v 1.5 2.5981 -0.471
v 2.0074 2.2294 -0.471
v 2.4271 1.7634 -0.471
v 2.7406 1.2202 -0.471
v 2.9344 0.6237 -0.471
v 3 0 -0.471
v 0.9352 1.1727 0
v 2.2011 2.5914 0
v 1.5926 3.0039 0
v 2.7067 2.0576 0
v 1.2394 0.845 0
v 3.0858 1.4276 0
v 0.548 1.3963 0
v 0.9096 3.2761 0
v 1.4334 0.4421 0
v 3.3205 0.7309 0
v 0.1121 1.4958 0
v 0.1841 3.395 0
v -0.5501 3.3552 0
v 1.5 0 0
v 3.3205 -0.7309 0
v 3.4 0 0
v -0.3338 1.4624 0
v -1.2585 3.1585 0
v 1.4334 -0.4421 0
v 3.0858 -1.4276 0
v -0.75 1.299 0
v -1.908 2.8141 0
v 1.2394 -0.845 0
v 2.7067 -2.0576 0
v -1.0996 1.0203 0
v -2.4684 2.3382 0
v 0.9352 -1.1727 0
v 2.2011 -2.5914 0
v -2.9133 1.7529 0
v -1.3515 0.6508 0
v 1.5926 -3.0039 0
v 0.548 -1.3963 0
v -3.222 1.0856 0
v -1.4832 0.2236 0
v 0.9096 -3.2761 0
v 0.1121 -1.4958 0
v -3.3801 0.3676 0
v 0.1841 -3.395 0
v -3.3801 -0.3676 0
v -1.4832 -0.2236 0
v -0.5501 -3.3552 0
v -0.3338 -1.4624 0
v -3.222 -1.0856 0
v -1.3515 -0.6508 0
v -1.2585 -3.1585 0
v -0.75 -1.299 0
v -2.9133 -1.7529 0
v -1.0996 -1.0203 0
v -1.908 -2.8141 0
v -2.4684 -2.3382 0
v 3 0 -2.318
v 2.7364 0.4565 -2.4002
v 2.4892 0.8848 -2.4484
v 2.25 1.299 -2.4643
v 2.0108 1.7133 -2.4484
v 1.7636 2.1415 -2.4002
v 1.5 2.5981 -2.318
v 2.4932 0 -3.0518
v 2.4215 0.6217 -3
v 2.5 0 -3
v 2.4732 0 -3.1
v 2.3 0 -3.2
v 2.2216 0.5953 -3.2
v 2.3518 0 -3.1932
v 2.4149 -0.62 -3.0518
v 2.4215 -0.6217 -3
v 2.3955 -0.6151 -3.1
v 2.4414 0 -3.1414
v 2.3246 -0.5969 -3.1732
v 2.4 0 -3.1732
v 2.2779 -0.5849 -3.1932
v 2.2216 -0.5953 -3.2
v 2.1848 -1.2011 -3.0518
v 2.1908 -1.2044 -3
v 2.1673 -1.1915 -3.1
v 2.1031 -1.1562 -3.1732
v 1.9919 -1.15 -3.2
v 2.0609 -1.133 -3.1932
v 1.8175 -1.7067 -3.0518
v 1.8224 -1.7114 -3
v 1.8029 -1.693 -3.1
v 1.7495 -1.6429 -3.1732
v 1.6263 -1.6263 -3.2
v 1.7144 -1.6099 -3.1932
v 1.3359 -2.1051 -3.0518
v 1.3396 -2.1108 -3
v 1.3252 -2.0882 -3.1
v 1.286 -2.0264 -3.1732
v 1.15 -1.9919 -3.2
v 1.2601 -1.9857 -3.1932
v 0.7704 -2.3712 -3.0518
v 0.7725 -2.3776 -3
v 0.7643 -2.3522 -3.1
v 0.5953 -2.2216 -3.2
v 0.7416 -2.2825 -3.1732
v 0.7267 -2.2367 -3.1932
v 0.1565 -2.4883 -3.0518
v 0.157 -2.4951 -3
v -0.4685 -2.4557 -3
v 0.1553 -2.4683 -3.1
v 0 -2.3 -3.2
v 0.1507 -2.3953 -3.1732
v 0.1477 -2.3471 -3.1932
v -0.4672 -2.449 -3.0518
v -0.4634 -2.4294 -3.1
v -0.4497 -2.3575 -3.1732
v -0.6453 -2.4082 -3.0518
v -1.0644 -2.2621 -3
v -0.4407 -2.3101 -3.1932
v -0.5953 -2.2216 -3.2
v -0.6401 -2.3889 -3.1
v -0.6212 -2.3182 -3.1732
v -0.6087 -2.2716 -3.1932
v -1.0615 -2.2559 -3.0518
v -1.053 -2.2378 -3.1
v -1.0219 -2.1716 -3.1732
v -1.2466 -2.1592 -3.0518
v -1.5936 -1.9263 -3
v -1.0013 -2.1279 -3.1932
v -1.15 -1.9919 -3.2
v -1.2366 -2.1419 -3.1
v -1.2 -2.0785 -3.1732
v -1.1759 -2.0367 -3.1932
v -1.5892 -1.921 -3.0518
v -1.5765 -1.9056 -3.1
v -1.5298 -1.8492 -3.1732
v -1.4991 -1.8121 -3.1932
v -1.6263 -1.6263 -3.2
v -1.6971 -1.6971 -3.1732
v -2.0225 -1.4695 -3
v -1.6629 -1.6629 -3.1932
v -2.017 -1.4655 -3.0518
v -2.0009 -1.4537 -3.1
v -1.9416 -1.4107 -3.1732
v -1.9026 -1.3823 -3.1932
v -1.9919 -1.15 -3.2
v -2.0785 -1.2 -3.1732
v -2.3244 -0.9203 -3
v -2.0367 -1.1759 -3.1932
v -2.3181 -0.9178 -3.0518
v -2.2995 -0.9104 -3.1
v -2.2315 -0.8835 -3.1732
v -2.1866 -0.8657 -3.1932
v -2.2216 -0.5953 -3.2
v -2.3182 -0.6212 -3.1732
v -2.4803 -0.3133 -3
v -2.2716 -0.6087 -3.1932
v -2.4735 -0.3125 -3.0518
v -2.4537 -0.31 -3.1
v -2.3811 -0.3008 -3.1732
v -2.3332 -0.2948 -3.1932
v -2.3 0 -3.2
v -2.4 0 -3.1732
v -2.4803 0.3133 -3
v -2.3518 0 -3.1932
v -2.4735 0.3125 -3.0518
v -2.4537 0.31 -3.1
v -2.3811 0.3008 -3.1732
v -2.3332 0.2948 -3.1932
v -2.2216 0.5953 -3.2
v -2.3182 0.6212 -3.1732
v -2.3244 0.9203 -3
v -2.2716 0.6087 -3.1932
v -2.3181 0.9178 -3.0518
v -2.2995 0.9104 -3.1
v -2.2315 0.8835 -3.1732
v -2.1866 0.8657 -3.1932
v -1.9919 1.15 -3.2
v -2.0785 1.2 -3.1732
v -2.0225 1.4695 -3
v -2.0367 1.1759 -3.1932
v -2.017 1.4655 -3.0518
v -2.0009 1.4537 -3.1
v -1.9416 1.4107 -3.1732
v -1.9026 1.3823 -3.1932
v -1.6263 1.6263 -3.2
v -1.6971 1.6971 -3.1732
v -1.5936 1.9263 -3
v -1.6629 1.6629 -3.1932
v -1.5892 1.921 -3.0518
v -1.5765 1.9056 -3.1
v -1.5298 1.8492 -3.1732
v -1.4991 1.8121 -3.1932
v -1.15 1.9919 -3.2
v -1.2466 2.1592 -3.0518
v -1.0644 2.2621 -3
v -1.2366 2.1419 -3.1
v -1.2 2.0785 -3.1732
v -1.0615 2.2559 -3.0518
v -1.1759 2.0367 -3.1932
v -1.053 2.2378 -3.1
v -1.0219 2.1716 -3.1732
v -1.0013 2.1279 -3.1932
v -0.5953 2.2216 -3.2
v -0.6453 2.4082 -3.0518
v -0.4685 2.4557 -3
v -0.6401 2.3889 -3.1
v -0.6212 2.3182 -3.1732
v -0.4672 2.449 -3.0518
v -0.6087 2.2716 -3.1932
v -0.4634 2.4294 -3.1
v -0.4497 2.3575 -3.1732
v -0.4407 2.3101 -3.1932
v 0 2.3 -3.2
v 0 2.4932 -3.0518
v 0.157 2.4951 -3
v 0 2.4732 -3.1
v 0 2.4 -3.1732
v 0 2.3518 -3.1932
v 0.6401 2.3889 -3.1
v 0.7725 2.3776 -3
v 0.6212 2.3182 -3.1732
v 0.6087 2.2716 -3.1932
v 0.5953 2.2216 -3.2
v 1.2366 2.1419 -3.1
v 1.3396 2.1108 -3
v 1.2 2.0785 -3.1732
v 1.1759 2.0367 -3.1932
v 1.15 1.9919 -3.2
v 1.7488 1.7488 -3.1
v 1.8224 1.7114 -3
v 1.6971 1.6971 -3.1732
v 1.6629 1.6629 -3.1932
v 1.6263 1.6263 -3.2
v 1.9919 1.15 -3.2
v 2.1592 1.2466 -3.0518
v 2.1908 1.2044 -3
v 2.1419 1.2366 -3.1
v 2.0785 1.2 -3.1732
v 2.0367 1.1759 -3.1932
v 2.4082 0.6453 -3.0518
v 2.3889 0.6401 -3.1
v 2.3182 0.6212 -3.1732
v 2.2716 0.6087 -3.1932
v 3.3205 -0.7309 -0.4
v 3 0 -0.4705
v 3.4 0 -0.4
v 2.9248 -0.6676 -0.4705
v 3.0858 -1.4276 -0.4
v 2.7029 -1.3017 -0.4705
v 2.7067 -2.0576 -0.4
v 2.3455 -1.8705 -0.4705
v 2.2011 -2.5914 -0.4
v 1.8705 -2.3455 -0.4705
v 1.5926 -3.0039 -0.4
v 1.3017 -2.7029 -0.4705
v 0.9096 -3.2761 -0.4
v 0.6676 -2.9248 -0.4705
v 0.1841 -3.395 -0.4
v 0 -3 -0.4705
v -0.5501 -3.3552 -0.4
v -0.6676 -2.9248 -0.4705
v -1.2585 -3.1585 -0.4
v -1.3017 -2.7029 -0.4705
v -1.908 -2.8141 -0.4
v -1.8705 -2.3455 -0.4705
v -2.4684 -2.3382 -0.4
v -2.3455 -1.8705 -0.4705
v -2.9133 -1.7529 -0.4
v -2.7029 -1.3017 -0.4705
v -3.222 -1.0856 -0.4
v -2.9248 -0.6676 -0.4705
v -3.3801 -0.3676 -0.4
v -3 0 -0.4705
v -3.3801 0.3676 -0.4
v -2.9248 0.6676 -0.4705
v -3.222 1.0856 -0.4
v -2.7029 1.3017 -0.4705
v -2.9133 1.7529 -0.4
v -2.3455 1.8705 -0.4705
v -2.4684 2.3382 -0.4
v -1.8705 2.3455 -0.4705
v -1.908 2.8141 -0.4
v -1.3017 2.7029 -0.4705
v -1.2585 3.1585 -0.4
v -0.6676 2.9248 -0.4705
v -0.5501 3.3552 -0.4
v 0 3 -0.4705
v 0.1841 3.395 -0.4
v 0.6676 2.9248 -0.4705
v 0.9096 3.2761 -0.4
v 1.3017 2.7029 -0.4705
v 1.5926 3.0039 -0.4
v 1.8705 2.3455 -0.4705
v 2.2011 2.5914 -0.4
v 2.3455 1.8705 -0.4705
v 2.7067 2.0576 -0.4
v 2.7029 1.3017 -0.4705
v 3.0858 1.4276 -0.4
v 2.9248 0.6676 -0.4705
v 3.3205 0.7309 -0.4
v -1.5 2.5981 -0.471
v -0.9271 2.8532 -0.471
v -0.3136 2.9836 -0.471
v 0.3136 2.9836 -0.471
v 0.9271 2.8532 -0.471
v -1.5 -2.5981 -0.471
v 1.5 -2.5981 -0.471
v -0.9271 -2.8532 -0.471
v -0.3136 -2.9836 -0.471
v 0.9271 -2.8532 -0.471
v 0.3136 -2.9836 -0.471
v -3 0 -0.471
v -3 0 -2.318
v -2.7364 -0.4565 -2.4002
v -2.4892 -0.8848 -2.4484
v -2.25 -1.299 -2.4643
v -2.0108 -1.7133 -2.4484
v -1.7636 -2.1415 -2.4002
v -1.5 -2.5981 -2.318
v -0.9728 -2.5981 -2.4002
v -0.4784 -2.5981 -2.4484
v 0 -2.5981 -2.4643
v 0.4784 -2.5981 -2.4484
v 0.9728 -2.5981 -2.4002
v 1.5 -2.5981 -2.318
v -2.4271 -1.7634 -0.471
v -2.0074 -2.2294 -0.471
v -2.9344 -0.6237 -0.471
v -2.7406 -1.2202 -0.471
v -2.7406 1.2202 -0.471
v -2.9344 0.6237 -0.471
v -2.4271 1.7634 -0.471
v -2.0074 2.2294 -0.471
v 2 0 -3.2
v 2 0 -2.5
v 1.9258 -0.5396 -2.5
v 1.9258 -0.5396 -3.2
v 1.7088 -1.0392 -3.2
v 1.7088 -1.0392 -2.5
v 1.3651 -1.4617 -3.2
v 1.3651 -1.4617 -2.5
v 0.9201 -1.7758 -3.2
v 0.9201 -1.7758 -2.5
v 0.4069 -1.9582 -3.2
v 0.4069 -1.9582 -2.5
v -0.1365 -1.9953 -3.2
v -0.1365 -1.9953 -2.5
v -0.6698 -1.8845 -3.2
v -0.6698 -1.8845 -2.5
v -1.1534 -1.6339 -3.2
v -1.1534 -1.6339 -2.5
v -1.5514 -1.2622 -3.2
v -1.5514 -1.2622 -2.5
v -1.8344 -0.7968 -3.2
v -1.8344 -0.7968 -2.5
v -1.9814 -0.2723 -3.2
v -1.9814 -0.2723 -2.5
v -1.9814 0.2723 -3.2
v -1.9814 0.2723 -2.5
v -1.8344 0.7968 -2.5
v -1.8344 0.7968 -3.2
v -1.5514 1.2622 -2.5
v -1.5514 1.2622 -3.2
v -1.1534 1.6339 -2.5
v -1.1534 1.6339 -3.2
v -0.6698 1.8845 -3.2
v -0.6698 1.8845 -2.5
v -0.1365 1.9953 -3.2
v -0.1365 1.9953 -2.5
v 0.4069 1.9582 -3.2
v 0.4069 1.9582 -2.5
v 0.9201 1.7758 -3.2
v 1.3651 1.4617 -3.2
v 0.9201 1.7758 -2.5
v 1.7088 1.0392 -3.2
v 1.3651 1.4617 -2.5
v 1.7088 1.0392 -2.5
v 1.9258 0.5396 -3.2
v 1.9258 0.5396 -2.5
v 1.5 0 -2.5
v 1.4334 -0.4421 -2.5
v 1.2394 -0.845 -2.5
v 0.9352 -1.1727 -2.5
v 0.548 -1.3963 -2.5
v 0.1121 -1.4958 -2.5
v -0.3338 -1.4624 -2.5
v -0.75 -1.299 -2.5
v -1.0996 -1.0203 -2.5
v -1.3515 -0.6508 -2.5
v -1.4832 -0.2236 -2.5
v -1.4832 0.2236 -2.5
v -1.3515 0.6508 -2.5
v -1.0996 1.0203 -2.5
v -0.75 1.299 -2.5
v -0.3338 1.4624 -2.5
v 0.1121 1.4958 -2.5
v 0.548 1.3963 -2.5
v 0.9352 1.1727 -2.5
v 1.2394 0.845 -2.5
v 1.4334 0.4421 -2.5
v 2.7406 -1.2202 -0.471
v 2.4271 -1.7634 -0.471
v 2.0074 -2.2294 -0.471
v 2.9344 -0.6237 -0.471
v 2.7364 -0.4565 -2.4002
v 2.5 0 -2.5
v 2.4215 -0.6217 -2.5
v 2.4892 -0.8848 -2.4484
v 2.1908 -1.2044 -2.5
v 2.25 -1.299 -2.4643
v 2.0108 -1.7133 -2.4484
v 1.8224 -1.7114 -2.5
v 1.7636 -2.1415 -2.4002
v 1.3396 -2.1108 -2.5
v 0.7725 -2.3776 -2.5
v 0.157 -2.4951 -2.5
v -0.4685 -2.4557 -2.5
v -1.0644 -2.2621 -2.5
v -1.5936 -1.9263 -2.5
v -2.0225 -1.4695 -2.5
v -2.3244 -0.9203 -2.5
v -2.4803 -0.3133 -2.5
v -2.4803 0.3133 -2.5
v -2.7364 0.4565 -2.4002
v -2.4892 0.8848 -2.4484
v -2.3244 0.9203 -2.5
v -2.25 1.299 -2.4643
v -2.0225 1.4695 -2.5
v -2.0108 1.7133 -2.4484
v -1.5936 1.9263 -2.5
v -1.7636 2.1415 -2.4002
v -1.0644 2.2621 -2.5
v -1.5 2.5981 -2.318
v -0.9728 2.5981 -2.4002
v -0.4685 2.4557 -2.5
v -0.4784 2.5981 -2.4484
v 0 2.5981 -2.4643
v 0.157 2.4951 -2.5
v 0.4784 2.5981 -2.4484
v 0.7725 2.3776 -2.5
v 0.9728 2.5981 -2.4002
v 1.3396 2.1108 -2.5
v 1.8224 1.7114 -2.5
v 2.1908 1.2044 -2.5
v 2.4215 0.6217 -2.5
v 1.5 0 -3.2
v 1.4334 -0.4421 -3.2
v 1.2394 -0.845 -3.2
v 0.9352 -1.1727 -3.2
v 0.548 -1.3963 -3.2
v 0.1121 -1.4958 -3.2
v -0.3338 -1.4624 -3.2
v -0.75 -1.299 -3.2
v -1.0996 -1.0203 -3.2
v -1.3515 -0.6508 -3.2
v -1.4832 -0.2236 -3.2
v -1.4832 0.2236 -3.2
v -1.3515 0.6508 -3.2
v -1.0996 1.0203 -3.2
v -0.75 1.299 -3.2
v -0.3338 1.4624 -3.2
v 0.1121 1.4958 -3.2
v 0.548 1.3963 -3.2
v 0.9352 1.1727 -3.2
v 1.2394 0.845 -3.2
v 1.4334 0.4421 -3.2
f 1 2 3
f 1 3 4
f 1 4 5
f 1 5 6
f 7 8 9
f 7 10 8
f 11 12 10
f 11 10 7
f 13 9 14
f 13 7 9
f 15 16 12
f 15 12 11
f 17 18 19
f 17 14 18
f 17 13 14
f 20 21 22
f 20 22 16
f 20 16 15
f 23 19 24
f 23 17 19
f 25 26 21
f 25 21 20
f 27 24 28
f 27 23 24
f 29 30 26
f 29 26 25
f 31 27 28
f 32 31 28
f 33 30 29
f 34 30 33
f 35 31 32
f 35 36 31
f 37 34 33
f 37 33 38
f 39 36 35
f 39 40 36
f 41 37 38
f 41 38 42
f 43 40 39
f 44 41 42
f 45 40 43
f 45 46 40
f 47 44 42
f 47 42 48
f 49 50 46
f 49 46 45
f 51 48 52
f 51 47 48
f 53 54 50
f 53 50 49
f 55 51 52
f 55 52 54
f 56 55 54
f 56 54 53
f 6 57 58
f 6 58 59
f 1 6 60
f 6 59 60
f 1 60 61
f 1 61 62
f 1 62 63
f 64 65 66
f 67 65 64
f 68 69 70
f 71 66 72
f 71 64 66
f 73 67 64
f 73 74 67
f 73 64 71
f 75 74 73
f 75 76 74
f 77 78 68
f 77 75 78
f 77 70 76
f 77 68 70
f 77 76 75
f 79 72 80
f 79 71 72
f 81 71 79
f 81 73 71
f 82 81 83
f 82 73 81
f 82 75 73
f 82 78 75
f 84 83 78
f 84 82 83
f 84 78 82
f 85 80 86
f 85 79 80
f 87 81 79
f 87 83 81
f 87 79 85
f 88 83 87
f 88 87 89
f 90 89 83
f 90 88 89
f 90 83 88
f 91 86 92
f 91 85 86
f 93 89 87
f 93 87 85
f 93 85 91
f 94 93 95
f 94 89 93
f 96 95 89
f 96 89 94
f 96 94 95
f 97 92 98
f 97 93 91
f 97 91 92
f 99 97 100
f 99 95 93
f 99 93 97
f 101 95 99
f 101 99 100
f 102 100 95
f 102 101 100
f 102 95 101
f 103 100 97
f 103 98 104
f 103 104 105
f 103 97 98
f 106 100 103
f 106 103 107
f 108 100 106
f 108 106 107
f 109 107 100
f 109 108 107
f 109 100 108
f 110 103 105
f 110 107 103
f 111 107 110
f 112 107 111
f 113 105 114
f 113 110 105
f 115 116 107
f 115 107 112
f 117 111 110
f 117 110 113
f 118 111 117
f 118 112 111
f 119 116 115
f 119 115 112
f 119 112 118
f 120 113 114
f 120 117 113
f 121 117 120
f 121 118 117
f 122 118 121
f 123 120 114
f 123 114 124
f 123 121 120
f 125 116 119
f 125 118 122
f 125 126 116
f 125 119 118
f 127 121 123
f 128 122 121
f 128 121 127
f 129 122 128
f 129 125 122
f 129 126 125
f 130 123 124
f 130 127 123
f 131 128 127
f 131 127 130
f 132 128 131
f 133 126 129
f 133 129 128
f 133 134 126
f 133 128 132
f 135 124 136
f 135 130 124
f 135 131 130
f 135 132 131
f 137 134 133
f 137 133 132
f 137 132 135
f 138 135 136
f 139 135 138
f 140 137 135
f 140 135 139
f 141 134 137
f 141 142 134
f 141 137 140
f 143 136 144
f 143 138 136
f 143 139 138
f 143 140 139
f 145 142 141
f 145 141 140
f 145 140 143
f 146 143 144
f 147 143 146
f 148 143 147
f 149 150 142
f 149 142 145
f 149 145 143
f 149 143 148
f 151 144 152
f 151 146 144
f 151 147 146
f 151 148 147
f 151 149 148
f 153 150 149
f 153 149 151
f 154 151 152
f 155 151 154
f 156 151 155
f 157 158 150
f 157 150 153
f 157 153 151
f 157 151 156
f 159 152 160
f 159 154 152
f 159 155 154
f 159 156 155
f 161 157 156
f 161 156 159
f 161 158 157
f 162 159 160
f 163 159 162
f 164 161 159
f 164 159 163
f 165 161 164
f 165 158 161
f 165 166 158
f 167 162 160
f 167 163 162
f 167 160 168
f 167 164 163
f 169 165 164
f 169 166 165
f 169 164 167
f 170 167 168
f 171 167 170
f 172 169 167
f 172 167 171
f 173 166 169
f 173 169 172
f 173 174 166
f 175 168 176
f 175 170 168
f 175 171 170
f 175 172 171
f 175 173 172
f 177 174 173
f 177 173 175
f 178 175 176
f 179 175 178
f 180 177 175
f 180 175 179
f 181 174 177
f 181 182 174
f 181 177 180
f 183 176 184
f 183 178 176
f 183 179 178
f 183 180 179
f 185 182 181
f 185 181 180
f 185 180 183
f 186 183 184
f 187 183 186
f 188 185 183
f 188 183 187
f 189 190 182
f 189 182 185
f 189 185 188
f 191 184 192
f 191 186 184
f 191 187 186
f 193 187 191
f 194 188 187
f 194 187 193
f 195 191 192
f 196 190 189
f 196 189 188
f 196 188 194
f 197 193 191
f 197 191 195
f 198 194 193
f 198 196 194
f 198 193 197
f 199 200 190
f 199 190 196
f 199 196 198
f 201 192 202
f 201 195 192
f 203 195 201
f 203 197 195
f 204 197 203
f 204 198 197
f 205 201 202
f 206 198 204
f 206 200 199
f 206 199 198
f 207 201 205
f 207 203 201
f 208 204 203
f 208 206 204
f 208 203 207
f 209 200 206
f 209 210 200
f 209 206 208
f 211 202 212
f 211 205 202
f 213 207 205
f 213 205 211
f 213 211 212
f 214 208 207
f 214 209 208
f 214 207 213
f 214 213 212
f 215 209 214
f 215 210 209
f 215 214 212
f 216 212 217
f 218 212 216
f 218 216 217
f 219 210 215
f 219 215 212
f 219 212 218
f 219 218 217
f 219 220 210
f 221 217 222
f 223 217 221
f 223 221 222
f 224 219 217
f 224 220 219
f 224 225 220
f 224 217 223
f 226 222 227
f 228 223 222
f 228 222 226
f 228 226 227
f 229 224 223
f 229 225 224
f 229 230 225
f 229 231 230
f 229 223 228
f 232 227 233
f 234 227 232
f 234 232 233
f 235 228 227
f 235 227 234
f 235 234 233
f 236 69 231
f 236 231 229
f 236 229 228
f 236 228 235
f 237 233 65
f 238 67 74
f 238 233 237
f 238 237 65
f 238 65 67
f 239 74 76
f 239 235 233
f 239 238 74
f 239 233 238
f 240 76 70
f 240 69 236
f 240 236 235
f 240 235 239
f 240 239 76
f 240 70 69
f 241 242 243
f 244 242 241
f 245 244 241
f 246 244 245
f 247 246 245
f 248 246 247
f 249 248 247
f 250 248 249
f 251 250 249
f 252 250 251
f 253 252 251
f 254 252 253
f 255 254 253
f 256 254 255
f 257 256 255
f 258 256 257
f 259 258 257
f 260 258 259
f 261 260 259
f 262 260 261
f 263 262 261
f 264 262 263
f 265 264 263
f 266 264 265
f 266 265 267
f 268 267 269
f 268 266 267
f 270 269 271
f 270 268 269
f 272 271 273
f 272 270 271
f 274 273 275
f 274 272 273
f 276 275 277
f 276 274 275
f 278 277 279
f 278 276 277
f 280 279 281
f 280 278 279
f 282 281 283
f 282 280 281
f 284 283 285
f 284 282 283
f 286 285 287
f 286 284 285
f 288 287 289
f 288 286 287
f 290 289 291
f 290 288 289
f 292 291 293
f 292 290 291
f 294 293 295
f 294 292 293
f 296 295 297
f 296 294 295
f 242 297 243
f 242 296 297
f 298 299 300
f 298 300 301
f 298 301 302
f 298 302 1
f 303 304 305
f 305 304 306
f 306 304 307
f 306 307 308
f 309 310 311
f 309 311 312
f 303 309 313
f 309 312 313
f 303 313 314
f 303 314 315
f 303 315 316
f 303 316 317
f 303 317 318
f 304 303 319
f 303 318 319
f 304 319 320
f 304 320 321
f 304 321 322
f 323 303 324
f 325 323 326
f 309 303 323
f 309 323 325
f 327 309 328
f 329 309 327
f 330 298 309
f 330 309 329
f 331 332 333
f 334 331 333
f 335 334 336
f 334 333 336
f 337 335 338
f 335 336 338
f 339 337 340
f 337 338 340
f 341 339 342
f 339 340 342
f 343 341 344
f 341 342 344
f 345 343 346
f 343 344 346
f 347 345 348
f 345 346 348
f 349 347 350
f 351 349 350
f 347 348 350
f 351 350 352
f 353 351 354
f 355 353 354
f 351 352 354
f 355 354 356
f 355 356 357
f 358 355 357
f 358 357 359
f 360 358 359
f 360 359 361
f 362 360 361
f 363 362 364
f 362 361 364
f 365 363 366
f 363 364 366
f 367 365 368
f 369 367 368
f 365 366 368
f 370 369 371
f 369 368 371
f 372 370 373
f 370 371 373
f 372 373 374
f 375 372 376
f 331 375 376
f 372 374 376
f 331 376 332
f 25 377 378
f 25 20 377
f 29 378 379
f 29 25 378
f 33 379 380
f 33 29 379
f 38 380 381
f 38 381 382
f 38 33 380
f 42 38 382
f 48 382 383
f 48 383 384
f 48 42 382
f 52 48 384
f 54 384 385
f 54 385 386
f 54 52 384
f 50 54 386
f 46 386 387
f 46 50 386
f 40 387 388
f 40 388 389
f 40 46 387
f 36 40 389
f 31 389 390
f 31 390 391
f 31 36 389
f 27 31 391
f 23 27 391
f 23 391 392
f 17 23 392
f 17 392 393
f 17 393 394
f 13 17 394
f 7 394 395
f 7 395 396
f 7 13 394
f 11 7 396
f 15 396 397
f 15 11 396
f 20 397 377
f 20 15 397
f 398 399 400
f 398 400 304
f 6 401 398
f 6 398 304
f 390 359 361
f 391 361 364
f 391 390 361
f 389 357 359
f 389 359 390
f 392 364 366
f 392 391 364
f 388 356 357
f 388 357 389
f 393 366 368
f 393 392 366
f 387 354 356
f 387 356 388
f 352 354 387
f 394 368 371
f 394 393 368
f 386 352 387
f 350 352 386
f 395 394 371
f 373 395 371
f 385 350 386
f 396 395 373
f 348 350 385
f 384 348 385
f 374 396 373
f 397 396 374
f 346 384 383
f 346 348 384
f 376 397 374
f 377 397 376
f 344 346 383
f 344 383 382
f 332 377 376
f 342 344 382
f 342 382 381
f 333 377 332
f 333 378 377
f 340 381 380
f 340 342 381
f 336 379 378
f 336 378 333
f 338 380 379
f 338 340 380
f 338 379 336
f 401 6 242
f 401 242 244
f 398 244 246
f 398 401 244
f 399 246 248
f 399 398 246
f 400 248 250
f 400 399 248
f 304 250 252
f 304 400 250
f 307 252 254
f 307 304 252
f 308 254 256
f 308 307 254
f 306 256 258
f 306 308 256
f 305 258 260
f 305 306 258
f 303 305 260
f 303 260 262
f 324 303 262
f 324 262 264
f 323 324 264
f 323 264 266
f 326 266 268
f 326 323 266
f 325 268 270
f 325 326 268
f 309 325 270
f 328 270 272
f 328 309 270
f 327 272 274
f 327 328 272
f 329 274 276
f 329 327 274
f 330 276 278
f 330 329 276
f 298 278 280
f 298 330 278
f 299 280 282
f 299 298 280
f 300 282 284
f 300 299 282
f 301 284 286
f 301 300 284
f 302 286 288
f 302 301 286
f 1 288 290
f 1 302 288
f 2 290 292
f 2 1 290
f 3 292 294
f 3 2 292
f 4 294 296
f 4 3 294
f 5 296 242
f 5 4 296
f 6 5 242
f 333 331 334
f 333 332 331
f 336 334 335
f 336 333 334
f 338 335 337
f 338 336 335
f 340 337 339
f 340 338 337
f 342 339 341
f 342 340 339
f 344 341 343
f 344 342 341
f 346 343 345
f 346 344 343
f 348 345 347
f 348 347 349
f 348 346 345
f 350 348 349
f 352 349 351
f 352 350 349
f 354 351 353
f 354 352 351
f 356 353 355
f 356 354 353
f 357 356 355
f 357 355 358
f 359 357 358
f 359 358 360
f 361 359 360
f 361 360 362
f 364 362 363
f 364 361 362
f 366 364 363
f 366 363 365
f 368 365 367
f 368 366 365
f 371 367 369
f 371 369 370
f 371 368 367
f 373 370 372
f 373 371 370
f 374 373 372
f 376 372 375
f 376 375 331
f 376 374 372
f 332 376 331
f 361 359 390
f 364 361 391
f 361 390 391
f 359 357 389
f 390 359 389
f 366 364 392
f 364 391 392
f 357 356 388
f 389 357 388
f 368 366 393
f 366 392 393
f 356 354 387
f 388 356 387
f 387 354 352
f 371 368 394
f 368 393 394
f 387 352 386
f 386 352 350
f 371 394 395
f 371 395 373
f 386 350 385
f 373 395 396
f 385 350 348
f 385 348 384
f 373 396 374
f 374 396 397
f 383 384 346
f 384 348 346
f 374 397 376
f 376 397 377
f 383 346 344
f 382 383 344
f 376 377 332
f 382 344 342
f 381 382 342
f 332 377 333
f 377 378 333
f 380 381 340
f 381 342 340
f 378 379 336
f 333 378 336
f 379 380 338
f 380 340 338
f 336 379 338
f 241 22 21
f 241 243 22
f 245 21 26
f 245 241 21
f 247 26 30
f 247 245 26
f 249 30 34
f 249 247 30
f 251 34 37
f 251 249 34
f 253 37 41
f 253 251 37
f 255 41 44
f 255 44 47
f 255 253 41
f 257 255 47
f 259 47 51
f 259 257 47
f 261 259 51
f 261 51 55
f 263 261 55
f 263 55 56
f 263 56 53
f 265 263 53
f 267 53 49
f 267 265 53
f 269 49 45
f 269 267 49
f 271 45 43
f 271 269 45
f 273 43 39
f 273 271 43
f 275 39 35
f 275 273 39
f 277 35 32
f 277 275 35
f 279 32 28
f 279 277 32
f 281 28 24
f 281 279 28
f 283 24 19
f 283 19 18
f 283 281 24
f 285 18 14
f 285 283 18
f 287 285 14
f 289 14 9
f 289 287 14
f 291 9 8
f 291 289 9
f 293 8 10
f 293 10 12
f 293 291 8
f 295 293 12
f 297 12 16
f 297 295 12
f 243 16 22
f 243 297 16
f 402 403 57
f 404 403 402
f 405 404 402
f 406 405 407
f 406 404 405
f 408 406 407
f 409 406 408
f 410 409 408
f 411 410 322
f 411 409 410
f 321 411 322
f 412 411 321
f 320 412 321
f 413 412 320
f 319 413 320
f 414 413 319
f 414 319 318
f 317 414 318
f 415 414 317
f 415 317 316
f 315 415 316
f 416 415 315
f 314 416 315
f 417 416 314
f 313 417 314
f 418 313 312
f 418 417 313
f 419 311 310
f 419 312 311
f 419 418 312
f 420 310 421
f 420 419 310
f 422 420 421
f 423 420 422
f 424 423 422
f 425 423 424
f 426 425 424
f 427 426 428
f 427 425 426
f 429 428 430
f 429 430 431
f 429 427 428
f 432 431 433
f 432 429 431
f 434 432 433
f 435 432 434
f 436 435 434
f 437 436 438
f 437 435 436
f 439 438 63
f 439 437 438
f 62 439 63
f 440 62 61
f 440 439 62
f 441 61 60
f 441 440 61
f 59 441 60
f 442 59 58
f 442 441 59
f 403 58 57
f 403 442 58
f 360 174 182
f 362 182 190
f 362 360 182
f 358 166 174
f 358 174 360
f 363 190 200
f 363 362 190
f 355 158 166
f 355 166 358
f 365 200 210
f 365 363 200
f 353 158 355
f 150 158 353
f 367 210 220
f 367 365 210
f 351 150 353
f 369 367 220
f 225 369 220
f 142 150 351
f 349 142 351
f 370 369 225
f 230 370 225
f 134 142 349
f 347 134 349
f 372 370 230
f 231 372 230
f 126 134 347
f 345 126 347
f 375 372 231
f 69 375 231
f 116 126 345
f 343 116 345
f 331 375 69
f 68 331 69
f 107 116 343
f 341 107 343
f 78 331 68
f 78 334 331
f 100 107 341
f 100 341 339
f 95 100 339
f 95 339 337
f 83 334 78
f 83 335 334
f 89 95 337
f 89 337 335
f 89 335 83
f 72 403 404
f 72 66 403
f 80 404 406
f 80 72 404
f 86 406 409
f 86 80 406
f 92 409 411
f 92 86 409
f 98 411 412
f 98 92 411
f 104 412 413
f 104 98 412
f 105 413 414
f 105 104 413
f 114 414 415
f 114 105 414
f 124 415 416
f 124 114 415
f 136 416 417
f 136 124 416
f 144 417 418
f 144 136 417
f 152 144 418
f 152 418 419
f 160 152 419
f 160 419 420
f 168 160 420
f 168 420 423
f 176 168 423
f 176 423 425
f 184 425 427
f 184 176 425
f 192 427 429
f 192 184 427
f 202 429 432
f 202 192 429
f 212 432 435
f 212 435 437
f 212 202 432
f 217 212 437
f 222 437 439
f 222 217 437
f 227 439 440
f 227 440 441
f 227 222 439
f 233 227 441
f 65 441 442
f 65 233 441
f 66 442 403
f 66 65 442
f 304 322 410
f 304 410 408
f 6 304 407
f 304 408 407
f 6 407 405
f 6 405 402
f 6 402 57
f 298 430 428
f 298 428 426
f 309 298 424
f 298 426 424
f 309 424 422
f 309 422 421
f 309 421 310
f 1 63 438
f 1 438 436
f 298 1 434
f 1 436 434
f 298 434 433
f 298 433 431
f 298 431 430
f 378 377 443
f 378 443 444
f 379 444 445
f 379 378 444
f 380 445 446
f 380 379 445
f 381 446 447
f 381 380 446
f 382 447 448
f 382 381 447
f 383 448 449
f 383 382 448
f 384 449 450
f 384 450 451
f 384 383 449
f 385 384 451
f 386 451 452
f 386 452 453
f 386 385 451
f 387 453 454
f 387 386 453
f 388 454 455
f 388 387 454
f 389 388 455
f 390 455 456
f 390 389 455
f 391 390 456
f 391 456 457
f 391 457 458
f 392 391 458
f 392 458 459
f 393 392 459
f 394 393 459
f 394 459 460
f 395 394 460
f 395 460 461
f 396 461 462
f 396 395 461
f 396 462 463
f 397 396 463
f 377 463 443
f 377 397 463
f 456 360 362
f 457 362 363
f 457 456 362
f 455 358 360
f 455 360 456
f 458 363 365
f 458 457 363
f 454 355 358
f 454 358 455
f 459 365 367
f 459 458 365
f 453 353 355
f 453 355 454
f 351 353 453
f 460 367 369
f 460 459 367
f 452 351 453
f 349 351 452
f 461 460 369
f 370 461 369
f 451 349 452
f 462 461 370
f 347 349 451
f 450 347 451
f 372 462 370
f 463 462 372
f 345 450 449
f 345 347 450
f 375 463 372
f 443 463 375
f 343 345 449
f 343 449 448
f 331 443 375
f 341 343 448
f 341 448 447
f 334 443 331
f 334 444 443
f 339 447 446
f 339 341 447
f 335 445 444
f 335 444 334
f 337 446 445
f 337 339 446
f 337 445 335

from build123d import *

# Parameters (mm, degrees)
CUT_EXTRUDE_2_DEPTH = 2.729
CUT_EXTRUDE_3_DEPTH = 2.729
CUT_EXTRUDE_8_DEPTH = 2.729
CUT_EXTRUDE_7_DEPTH = 2.729
SKETCH_11_R         = 2
SKETCH_11_R_2       = 1.5
EXTRUDE_3_DEPTH     = 0.7
CUT_EXTRUDE_9_DEPTH = 2.729


with BuildPart() as part:
    # 草图2 → 旋转2 (revolve)
    with BuildSketch(Plane(origin=(0, 0, 0), x_dir=(0, 0, -1), z_dir=(1, 0, 0)), mode=Mode.PRIVATE) as revolve_2_sk:
        with BuildLine():
            Line((0, 1.5), (0, 3.4))
            Line((0, 3.4), (0.4, 3.4))
            Line((0.4, 3.4), (0.470530792, 3))
            Line((0.470530792, 3), (2.318014883, 3))
            Line((2.318014883, 3), (2.5, 2.5))
            Line((2.5, 2.5), (3, 2.5))
            ThreePointArc((3, 2.5), (3.141421356, 2.441421356), (3.2, 2.3))
            Line((3.2, 2.3), (3.2, 2))
            Line((3.2, 2), (2.5, 2))
            Line((2.5, 2), (2.5, 1.5))
            Line((2.5, 1.5), (0, 1.5))
        make_face()
    revolve(revolve_2_sk.sketch.rotate(Axis((0, 0, 0), (0, 0, -1)), 90), axis=Axis((0, 0, 0), (0, 0, -1)))

    # 草图10 → 切除-拉伸2 (cut)
    with BuildSketch(Plane(origin=(0, 0, -3.2), x_dir=(-1, 0, 0), z_dir=(0, 0, -1))):
        with BuildLine():
            Line((-3, 0), (-1.5, 2.598076211))
            ThreePointArc((-1.5, 2.598076211), (-2.598076211, 1.5), (-3, 0))
        make_face()
    extrude(amount=-CUT_EXTRUDE_2_DEPTH, mode=Mode.SUBTRACT)

    # 草图10<4> → 切除-拉伸3 (cut)
    with BuildSketch(Plane(origin=(0, 0, -3.2), x_dir=(-1, 0, 0), z_dir=(0, 0, -1))):
        with BuildLine():
            Line((-1.5, -2.598076211), (-3, 0))
            ThreePointArc((-3, 0), (-2.598076211, -1.5), (-1.5, -2.598076211))
        make_face()
    extrude(amount=-CUT_EXTRUDE_3_DEPTH, mode=Mode.SUBTRACT)

    # 草图10<8> → 切除-拉伸8 (cut)
    with BuildSketch(Plane(origin=(0, 0, -3.2), x_dir=(-1, 0, 0), z_dir=(0, 0, -1))):
        with BuildLine():
            ThreePointArc((1.5, 2.598076211), (0, 3), (-1.5, 2.598076211))
            Line((-1.5, 2.598076211), (1.5, 2.598076211))
        make_face()
    extrude(amount=-CUT_EXTRUDE_8_DEPTH, mode=Mode.SUBTRACT)

    # 草图10<7> → 切除-拉伸7 (cut)
    with BuildSketch(Plane(origin=(0, 0, -3.2), x_dir=(-1, 0, 0), z_dir=(0, 0, -1))):
        with BuildLine():
            ThreePointArc((1.5, 2.598076211), (0, 3), (-1.5, 2.598076211))
            Line((-1.5, 2.598076211), (1.5, 2.598076211))
        make_face()
        with BuildLine():
            ThreePointArc((3, 0), (2.598076211, 1.5), (1.5, 2.598076211))
            Line((1.5, 2.598076211), (3, 0))
        make_face()
        with BuildLine():
            ThreePointArc((1.5, -2.598076211), (2.598076211, -1.5), (3, 0))
            Line((3, 0), (1.5, -2.598076211))
        make_face()
    extrude(amount=-CUT_EXTRUDE_7_DEPTH, mode=Mode.SUBTRACT)

    # 草图10<9> → 切除-拉伸9 (cut)
    with BuildSketch(Plane(origin=(0, 0, -3.2), x_dir=(-1, 0, 0), z_dir=(0, 0, -1))):
        with BuildLine():
            Line((1.5, -2.598076211), (-1.5, -2.598076211))
            ThreePointArc((-1.5, -2.598076211), (0, -3), (1.5, -2.598076211))
        make_face()
    extrude(amount=-CUT_EXTRUDE_9_DEPTH, mode=Mode.SUBTRACT)


with BuildPart() as body_2:
    # 草图11 → 凸台-拉伸3 (new body)
    with BuildSketch(Plane(origin=(0, 0, -2.5), x_dir=(-1, 0, 0), z_dir=(0, 0, -1))):
        with Locations(Location((0, 0, 0), (0, 0, 180))):
            Circle(SKETCH_11_R)
        with Locations(Location((0, 0, 0), (0, 0, 180))):
            Circle(SKETCH_11_R_2, mode=Mode.SUBTRACT)
    extrude(amount=EXTRUDE_3_DEPTH)


solid = Compound([part.part, body_2.part])
